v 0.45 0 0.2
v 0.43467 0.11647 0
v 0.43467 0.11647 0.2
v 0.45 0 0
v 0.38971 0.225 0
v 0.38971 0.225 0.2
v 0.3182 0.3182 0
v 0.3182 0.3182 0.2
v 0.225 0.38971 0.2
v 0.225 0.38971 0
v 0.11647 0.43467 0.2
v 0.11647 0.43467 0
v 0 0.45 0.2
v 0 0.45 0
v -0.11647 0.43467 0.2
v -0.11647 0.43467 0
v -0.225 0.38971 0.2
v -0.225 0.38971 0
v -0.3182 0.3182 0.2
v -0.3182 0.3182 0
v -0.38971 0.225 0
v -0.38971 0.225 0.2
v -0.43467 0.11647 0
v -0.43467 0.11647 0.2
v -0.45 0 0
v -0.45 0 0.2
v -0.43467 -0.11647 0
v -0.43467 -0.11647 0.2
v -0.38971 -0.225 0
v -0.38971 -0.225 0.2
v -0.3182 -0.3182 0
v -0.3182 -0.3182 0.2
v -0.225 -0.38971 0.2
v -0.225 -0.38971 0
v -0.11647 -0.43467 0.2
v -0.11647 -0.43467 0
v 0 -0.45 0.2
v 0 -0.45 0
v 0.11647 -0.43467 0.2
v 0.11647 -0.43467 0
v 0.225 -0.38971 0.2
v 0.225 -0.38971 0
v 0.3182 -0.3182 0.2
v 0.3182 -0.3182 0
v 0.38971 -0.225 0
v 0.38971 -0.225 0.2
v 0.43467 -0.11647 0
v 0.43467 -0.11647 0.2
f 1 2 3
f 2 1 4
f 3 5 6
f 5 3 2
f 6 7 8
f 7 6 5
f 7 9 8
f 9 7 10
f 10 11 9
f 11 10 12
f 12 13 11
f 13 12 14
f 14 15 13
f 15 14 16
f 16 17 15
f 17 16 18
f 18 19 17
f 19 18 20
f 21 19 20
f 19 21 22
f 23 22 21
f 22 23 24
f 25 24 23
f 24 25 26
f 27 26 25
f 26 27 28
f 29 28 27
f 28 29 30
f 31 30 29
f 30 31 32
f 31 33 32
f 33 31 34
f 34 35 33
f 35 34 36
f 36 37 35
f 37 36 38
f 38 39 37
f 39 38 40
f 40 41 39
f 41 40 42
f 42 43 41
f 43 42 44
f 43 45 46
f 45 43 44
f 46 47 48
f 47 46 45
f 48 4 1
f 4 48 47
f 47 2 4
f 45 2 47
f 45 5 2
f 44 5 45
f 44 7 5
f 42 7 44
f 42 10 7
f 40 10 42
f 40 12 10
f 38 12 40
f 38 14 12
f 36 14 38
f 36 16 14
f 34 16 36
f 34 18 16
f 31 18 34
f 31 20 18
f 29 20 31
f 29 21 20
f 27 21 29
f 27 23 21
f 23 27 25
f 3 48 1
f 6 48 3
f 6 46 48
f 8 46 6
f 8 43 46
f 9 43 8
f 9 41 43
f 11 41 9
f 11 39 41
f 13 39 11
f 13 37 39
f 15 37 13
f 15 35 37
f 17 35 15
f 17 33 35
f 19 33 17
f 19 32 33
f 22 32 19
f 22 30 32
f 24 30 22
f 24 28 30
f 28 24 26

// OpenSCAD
use <lib.scad>

module base() {
	translate([0,0,0.1]) cyl(0.45, 0.45, 0.2);
}

module pillar() {
	translate([0,-0.30,0.9]) rbox([0.32,0.2,1.8],0.01,$fn=$fn/4);
}

module telescope1() {
	#translate([0,0,1.625]) rotate([90,0,0]) cyl(0.15, 0.15, 0.5);
}

module telescope2() {
	#translate([0,0,1.625]) rotate([90,0,0]) cyl(0.125, 0.125, 0.5);
}

module telescope3() {
	#translate([0,0,1.625]) rotate([90,0,0]) cyl(0.10, 0.10, 0.5);
}

module telescope4() {
	#translate([0,0,1.625]) rotate([90,0,0]) cyl(0.075, 0.075, 0.5);
}

module telescope5() {
	#translate([0,0,1.625]) rotate([90,0,0]) cyl(0.05, 0.05, 0.5);
}

module grip() {
	union() {
		translate([0,0,1.67]) sphere(0.2);
		translate([0,0,1.52]) cyl(0.2, 0.2, 0.1);
	}
}

d = 24;

base($fn=d);
//pillar($fn=d);
//telescope1($fn=d);
//telescope2($fn=d);
//telescope3($fn=d);
//telescope4($fn=d);
//telescope5($fn=d);
//grip($fn=d);
